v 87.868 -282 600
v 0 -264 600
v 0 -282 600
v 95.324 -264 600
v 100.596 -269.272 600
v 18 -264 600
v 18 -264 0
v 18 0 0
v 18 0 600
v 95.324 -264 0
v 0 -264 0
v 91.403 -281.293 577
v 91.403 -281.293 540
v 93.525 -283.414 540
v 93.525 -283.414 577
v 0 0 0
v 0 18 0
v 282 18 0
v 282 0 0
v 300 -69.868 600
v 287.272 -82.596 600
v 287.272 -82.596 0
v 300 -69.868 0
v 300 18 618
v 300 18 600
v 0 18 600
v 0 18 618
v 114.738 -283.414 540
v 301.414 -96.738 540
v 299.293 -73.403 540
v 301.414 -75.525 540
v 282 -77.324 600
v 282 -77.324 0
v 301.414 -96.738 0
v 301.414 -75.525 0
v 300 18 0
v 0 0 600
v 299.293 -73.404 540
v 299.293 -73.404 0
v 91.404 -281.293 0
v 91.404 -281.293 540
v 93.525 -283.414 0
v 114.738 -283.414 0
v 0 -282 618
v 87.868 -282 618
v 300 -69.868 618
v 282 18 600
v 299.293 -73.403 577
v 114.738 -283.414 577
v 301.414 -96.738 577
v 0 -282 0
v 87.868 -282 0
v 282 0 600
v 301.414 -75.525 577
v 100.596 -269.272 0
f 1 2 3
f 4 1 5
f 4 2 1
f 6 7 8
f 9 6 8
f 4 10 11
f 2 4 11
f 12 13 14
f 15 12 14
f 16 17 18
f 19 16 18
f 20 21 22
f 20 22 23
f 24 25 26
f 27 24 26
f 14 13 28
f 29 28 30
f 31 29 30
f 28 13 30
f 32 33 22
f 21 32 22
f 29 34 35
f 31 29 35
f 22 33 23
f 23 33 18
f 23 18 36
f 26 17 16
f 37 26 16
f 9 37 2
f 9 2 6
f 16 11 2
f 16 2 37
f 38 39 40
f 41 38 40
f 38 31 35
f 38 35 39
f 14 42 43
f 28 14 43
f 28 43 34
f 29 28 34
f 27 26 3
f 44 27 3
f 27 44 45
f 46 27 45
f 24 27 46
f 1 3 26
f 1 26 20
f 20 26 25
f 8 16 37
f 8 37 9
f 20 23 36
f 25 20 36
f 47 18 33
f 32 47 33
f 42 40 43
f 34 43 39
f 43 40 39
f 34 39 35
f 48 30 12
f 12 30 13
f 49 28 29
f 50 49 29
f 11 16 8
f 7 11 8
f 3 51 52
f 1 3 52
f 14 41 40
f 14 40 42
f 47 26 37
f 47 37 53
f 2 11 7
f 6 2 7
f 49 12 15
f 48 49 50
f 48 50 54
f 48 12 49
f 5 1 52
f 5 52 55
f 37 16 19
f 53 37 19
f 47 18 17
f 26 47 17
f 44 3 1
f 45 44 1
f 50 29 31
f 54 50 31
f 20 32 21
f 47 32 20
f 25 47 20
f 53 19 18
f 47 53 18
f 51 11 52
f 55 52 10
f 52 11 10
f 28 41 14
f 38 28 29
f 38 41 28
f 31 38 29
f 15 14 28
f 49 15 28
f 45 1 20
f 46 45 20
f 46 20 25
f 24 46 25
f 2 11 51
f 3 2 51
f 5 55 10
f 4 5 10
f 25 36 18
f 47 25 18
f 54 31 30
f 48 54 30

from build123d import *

# Parameters (mm, degrees)
F0_W     = 18
F0_H     = 264
F1_DEPTH = 600
F2_DEPTH = 600
F3_DEPTH = 600
F4_DEPTH = 540
F6_DEPTH = 18
F7_DEPTH = 37


with BuildPart() as f1:
    # F0 (on Top) → F1 (new body)
    with BuildSketch(Plane.XY):
        with Locations((9, -132)):
            Rectangle(F0_W, F0_H)
    extrude(amount=F1_DEPTH)


with BuildPart() as f2:
    # F0 (on Top) → F2 (new body)
    with BuildSketch(Plane.XY):
        Polygon((0, 18), (0, 0), (18, 0), (282, 0), (282, 18), align=None)
    extrude(amount=F2_DEPTH)


with BuildPart() as f3:
    # F0 (on Top) → F3 (new body)
    with BuildSketch(Plane.XY):
        Polygon((18, -264), (0, -264), (0, -282), (87.867966, -282), (100.595888, -269.272078), (95.32381, -264), align=None)
        Polygon((282, 18), (282, 0), (282, -77.32381), (287.272078, -82.595888), (300, -69.867966), (300, 18), align=None)
    extrude(amount=F3_DEPTH)


with BuildPart() as f4:
    # F0 (on Top) → F4 (new body)
    with BuildSketch(Plane.XY):
        Polygon((93.52482, -283.414214), (114.738023, -283.414214), (301.414214, -96.738023), (301.414214, -75.52482), (299.292893, -73.4035), (91.4035, -281.292893), align=None)
    extrude(amount=F4_DEPTH)


with BuildPart() as f6:
    # F5 (on face) → F6 (new body)
    with BuildSketch(Plane.XY.offset(600)):
        Polygon((0, 0), (0, -264), (0, -282), (87.867966, -282), (300, -69.867966), (300, 18), (282, 18), (0, 18), align=None)
    extrude(amount=F6_DEPTH)


with BuildPart() as f7:
    # F4_face (on face) → F7 (new body)
    with BuildSketch(Plane(origin=(201.586561, -183.586561, 540), x_dir=(1, 0, 0), z_dir=(0, 0, 1))):
        Polygon((-110.183062, -97.706332), (-108.061741, -99.827652), (-86.848538, -99.827652), (99.827652, 86.848538), (99.827652, 108.061741), (97.706332, 110.183062), align=None)
    extrude(amount=F7_DEPTH)


solid = Compound([f1.part, f2.part, f3.part, f4.part, f6.part, f7.part])
